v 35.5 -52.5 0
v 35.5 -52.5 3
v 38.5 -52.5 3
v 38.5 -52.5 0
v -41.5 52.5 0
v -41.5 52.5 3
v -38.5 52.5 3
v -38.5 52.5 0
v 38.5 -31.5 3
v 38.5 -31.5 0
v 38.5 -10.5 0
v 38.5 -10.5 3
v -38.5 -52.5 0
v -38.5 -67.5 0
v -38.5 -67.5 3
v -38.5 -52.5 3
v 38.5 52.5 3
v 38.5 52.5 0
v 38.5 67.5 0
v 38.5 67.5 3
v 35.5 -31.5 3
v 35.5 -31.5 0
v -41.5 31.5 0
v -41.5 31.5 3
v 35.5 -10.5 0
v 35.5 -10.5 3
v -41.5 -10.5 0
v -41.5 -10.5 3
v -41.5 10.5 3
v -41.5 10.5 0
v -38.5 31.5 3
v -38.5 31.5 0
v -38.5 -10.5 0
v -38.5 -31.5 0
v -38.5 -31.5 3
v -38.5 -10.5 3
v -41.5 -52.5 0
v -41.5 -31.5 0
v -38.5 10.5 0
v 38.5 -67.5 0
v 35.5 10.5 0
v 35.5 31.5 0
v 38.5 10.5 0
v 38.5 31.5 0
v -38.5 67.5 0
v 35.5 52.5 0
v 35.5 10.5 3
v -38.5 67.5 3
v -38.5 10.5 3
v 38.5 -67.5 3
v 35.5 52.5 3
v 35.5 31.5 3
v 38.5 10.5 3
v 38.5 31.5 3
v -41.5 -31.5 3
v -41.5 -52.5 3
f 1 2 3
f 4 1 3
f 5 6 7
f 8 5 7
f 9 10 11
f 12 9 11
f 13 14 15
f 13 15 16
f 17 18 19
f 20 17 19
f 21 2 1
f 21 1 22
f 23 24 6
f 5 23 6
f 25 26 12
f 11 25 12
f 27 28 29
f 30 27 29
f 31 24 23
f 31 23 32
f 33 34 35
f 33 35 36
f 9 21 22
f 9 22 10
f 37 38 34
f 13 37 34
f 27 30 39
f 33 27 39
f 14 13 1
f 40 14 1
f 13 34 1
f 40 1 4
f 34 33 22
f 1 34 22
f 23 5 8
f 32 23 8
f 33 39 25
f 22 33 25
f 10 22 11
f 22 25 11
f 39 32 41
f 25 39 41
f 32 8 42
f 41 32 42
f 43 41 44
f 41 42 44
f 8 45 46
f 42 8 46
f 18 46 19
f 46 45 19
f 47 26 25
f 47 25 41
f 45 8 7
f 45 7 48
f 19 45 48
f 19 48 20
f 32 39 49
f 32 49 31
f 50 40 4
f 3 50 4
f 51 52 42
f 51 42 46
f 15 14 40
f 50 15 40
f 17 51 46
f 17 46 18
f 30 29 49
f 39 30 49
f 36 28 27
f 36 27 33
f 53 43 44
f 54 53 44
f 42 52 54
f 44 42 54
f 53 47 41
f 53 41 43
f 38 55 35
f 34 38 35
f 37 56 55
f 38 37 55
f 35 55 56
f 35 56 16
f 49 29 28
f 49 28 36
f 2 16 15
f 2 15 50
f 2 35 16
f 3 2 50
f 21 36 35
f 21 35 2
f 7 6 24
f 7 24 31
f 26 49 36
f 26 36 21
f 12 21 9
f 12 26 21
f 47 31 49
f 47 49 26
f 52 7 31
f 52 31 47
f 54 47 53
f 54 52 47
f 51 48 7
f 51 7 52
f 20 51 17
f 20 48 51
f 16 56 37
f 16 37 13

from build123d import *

# Parameters (mm, degrees)
ESBO_O1_W                = 77
ESBO_O1_H                = 135
RESSALTO_EXTRUS_O1_DEPTH = 3
ESBO_O4_W                = 3
ESBO_O4_H                = 21
CORTE_EXTRUS_O1_DEPTH    = 78.765673661
ESBO_O5_W                = 3
ESBO_O5_H                = 21
RESSALTO_EXTRUS_O2_DEPTH = 3
PADR_O_LINEAR1_COUNT     = 3
PADR_O_LINEAR1_PITCH     = 42


with BuildPart() as part:
    # Esboço1 → Ressalto-extrusão1 (new body)
    with BuildSketch(Plane.XY):
        Rectangle(ESBO_O1_W, ESBO_O1_H)
    extrude(amount=RESSALTO_EXTRUS_O1_DEPTH)

    # Esboço4 → Corte-extrusão1 (cut, through all)
    with BuildSketch(Plane.XY.offset(3)):
        with Locations((37, 42)):
            Rectangle(ESBO_O4_W, ESBO_O4_H)
        with Locations((37, 0)):
            Rectangle(ESBO_O4_W, ESBO_O4_H)
        with Locations((37, -42)):
            Rectangle(ESBO_O4_W, ESBO_O4_H)
    extrude(amount=-CORTE_EXTRUS_O1_DEPTH, mode=Mode.SUBTRACT)

    # Esboço5 → Ressalto-extrusão2 (add)
    with BuildSketch(Plane.XY.offset(3)):
        with Locations((-40, 42)):
            Rectangle(ESBO_O5_W, ESBO_O5_H)
    ressalto_extrus_o2 = extrude(amount=-RESSALTO_EXTRUS_O2_DEPTH)

    # Padrão linear1: Ressalto-extrusão2 ×3
    with Locations(*[(0, -i * PADR_O_LINEAR1_PITCH, 0) for i in range(1, PADR_O_LINEAR1_COUNT)]):
        add(ressalto_extrus_o2)


solid = part.part
